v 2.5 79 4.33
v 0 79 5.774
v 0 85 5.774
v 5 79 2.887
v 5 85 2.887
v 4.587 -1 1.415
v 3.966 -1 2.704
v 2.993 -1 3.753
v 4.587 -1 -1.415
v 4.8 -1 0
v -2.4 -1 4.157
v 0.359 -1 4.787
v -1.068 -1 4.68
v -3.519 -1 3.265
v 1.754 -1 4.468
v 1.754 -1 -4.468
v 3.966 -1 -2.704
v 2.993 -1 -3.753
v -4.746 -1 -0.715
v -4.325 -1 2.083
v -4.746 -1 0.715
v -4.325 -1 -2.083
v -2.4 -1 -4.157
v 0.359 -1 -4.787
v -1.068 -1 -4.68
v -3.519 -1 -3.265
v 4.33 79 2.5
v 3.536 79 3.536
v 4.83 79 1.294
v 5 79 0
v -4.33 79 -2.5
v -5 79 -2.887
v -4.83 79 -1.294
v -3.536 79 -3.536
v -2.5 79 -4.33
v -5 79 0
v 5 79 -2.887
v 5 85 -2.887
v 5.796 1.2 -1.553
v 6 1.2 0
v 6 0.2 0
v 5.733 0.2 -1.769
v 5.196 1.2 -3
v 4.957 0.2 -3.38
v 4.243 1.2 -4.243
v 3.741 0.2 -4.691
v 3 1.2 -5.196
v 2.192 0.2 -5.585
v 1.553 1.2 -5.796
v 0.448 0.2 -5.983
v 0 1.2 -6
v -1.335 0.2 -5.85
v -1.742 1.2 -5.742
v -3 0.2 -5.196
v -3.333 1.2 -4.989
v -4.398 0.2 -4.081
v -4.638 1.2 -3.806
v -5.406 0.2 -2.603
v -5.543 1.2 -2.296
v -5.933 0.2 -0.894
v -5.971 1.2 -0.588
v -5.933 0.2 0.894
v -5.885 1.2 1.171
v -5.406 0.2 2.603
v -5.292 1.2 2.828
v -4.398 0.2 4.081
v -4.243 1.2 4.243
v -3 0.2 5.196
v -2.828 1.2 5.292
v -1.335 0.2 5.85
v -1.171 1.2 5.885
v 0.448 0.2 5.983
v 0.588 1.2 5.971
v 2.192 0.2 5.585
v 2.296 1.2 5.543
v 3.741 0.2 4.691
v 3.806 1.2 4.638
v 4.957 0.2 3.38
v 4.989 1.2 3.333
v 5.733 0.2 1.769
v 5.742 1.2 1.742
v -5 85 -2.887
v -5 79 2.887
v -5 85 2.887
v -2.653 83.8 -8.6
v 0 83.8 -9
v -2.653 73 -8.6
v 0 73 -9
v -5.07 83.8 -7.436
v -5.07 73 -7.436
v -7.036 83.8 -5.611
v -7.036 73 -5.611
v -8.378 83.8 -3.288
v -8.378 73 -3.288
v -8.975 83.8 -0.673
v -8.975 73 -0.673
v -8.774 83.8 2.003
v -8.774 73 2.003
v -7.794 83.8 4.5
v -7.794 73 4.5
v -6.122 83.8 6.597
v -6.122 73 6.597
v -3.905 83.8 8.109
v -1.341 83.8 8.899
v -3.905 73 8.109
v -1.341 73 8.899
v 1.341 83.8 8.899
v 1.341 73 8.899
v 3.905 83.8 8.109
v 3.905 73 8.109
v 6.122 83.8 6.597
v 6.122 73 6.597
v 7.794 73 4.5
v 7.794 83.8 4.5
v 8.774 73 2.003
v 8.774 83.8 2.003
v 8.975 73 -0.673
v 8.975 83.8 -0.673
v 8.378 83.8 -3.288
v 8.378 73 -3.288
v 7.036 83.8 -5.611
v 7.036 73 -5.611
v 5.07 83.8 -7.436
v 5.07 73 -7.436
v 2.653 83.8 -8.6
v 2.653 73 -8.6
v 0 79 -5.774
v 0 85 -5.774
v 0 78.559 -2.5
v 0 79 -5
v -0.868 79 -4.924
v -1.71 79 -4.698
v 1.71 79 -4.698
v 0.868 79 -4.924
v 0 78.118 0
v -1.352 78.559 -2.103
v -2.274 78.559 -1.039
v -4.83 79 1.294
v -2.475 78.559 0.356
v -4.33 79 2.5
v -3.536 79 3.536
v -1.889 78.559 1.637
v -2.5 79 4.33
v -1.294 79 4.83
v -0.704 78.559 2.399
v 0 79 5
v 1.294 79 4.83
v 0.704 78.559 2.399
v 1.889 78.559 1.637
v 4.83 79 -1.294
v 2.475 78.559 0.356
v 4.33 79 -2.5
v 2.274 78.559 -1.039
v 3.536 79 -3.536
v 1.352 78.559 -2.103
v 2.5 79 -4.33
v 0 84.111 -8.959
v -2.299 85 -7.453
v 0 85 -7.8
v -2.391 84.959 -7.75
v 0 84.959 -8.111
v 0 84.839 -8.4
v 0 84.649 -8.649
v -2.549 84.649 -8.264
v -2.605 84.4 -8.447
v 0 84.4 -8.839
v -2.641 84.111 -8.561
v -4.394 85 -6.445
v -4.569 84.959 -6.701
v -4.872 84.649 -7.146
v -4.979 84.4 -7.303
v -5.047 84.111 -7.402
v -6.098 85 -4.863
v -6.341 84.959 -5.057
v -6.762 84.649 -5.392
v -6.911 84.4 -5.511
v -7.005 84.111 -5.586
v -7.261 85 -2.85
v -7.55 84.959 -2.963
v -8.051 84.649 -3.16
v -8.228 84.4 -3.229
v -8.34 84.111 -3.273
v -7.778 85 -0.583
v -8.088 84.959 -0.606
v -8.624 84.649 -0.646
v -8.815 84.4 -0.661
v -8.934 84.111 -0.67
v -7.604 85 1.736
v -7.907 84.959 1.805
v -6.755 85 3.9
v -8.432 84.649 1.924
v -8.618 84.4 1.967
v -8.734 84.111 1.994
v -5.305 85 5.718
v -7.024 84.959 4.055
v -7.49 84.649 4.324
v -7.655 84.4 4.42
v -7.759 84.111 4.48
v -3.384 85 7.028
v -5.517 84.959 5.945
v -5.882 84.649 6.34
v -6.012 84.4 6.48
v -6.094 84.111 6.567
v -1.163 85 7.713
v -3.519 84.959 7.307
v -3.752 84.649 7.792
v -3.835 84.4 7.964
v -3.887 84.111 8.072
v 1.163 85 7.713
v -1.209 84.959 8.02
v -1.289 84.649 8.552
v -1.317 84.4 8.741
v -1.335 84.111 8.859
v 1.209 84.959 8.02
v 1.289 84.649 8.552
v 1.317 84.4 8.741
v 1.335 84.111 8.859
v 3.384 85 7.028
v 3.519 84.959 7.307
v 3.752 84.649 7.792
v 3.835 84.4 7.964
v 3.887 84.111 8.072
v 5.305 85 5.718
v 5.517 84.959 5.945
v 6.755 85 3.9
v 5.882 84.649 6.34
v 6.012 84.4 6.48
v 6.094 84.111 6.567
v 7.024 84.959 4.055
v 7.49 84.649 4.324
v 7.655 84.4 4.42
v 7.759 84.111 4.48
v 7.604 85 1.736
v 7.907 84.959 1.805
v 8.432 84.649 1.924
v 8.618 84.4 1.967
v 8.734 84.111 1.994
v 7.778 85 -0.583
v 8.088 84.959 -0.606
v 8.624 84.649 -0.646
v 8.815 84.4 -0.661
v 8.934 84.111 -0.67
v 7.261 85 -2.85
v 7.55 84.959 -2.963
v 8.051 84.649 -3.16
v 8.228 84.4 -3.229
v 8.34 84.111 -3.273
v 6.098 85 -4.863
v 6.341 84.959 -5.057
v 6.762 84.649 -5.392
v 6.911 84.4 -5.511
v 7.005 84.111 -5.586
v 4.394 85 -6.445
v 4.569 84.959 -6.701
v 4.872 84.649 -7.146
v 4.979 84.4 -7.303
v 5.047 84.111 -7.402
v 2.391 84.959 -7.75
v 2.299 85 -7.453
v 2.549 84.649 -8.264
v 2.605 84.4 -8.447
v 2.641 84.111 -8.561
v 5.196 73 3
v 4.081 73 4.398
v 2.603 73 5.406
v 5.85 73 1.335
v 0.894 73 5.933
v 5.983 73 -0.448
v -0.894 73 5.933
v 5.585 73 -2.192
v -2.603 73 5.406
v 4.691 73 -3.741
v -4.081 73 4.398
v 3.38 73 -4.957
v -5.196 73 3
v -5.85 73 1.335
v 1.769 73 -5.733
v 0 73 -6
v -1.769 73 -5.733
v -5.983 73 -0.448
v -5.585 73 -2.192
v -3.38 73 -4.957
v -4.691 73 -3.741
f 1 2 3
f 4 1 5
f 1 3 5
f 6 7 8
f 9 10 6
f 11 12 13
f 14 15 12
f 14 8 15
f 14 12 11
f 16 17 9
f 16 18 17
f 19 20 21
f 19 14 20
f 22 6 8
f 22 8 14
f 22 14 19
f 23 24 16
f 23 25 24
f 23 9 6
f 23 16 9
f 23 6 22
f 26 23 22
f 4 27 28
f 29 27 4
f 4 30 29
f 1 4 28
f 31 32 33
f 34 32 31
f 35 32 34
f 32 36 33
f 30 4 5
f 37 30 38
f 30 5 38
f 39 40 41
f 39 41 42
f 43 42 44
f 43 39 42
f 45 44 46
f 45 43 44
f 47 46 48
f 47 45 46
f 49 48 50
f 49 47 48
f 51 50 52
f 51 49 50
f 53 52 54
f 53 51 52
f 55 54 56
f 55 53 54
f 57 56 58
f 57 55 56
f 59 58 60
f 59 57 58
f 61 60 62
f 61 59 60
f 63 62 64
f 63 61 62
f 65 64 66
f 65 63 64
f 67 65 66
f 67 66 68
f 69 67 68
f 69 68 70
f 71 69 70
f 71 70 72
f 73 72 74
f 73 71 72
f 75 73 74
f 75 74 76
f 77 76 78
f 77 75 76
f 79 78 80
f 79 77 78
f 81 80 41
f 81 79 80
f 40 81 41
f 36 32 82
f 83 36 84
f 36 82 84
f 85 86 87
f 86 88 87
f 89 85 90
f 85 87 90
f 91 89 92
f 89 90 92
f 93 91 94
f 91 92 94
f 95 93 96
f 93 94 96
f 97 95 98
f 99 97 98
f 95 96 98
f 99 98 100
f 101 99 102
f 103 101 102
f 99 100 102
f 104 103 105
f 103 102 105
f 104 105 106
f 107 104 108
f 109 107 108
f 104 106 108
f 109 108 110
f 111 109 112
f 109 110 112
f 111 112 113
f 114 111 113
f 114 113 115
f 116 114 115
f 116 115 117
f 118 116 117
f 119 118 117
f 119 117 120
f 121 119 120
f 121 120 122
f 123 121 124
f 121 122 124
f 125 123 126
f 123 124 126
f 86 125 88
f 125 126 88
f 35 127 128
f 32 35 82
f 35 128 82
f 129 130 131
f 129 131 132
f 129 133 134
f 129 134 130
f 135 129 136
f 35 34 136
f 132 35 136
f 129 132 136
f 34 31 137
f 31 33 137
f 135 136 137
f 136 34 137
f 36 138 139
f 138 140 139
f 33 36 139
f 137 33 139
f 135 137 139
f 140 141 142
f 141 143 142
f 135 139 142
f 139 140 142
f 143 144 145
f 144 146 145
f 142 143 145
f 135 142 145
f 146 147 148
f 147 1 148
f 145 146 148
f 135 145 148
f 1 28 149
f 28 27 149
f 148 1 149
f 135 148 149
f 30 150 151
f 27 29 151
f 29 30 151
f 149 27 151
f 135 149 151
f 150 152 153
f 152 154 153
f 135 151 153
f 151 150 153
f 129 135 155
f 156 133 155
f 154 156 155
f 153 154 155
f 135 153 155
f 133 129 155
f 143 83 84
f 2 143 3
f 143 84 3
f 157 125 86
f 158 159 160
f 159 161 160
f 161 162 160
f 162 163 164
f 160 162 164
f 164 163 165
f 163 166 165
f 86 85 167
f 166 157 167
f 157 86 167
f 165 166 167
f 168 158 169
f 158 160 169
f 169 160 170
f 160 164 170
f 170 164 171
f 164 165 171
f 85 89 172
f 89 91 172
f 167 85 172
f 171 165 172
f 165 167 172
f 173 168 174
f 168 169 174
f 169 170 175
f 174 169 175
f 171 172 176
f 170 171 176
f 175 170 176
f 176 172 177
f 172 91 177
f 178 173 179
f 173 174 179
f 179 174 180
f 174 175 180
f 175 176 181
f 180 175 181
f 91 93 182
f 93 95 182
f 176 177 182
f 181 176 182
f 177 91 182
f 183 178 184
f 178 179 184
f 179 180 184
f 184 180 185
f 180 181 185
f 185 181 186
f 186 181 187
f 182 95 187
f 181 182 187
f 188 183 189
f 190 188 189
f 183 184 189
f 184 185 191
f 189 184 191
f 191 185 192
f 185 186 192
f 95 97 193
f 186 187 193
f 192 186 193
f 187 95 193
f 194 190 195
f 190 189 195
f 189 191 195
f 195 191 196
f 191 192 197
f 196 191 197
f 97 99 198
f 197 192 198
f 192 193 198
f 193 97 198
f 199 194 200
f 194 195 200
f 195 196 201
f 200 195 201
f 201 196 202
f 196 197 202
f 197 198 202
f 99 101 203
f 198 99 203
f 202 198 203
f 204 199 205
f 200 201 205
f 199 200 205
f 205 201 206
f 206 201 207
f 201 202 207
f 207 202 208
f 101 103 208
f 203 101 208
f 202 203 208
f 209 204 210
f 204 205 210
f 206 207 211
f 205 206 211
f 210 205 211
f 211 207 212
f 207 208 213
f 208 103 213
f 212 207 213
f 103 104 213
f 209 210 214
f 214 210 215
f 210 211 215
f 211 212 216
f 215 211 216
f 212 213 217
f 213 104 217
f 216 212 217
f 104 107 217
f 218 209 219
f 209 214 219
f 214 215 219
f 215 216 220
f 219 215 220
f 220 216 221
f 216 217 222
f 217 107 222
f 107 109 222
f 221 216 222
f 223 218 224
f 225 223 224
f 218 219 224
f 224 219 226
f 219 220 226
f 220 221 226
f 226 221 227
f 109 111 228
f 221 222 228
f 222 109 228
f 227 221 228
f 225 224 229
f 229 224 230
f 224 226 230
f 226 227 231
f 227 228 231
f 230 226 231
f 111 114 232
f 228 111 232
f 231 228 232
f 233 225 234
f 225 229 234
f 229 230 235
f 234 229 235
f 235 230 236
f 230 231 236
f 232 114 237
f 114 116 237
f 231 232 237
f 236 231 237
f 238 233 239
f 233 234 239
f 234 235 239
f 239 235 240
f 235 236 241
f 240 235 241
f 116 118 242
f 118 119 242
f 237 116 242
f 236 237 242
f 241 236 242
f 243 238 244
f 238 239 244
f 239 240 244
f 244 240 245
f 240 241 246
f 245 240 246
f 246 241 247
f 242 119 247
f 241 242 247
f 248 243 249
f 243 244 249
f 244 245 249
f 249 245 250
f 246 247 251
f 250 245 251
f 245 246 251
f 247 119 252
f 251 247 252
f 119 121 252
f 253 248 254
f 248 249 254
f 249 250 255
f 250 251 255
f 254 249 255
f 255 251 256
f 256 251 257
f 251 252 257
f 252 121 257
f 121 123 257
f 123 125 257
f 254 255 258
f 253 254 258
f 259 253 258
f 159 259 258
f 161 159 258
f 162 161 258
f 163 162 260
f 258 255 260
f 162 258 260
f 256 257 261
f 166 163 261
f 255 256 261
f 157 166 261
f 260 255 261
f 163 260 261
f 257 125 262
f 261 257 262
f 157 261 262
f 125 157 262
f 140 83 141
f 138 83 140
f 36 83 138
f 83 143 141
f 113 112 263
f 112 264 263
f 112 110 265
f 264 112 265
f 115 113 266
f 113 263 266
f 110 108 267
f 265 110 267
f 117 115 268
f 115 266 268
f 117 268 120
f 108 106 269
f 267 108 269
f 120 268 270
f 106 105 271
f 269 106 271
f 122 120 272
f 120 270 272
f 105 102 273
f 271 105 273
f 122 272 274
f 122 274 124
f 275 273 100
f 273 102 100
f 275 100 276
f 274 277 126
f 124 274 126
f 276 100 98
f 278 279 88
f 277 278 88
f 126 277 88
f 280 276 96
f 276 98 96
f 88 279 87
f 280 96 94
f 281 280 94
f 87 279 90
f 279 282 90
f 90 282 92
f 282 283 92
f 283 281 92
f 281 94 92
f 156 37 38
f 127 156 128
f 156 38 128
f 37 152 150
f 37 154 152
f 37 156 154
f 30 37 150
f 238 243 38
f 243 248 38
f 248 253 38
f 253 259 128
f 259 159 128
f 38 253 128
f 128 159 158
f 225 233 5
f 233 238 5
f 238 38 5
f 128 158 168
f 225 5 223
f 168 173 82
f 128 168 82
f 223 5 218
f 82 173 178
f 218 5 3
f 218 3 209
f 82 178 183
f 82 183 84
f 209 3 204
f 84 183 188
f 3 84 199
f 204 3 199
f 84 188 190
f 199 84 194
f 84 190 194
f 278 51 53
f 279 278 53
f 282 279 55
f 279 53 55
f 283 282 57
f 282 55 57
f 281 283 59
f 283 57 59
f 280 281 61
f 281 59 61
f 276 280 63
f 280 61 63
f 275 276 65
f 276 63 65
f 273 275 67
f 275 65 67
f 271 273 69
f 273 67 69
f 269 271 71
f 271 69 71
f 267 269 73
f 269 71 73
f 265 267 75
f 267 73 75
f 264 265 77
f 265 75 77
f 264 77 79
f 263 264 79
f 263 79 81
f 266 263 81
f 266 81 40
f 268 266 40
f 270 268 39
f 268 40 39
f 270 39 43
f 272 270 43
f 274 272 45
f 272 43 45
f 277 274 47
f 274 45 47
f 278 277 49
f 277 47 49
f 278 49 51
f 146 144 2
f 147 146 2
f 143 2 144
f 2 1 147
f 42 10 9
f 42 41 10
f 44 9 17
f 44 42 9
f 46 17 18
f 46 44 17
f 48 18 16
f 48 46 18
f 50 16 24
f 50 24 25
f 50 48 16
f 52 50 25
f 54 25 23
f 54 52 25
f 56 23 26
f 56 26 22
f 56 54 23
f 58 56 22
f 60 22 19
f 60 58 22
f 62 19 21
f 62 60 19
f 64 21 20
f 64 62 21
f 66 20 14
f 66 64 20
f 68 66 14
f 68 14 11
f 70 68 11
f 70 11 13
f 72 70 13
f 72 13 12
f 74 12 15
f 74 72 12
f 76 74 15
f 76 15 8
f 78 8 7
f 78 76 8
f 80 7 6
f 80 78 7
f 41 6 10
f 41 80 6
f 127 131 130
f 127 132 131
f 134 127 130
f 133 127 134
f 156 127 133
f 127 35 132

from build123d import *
from build123d.topology import SkipClean

# Parameters (mm, degrees)
CUT_EXTRUDE1_DEPTH = 6


# Read off the part's stored shape, not the designer's step: Move Face1
with BuildPart() as part:
    # Sketch1 → Revolve1 (revolve)
    with BuildSketch(Plane(origin=(0, 0, 0), x_dir=(0, 0, -1), z_dir=(1, 0, 0)), mode=Mode.PRIVATE) as revolve1_sk:
        with BuildLine():
            Line((0, 78.118365096), (-5, 79))
            Line((-5, 79), (-5, 85))
            Line((-5, 85), (-7.8, 85))
            ThreePointArc((-7.8, 85), (-8.648528137, 84.648528137), (-9, 83.8))
            Line((-9, 83.8), (-9, 73))
            Line((-9, 73), (-6, 73))
            Line((-6, 73), (-6, 1.2))
            Line((-6, 1.2), (-4.8, 0))
            Line((-4.8, 0), (0, 0))
            Line((0, 0), (0, 78.118365096))
        make_face()
    revolve(revolve1_sk.sketch.rotate(Axis((0, 0, 0), (0, 1, 0)), 180), axis=Axis((0, 0, 0), (0, 1, 0)))

    # Sketch2 → Cut-Extrude1 (cut)
    with BuildSketch(Plane(origin=(0, 85, 0), x_dir=(1, 0, 0), z_dir=(0, 1, 0))):
        Polygon((0, 5.773502692), (-5, 2.886751346), (-5, -2.886751346), (0, -5.773502692), (5, -2.886751346), (5, 2.886751346), align=None)
    extrude(amount=-CUT_EXTRUDE1_DEPTH, mode=Mode.SUBTRACT)

    # Move Face1 outline → Move Face1 (revolve)
    with SkipClean():  # the faces are left unmerged after this step: merging them gives an invalid solid
        with BuildSketch(Plane.XY):
            Polygon((0, -1), (4.8, -1), (6, 0.2), (6, 1.2), (4.8, 0), (0, 0), align=None)
        revolve(axis=Axis((0, 0, 0), (0, 1, 0)))
    add(part.part.scale(1), mode=Mode.REPLACE)  # the faces are merged on a copy


solid = part.part
